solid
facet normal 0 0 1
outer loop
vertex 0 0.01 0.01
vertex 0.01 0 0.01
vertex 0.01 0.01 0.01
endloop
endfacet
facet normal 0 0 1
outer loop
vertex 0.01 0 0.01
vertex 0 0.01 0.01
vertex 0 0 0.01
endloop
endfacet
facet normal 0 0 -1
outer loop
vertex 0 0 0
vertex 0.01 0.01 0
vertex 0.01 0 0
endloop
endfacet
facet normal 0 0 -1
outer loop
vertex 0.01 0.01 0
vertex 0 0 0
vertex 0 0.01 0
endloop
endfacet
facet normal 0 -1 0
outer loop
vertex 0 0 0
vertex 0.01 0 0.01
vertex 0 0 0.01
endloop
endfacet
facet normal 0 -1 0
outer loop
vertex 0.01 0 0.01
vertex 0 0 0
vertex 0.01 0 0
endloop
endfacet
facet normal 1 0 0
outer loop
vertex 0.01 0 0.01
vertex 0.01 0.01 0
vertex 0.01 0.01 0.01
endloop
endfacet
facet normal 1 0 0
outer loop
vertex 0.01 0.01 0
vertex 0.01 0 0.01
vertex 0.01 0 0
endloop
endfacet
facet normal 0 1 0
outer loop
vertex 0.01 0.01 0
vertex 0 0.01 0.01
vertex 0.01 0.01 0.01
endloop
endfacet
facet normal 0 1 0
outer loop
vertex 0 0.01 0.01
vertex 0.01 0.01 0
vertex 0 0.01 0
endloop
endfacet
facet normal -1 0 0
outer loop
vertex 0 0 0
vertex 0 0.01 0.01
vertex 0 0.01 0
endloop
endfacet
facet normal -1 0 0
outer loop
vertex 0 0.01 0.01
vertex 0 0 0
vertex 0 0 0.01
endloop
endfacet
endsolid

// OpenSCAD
// file: ../../src/common/common_params.scad
/***
 * @module Common Parameters
 * @brief Shared constants and tolerances used by the CurveGears implementation.
 *
 * Historical constants are retained for numerical compatibility.
 */
_cg_pi = 3.14159;
_cg_deg_per_rad = 57.29578;
_cg_tolerance = 1e-7;
_cg_default_fn = 50;
_cg_circle_pi = 3.141592653589793;

/**
 * @module _cg_assert_samples
 * @brief Validate a sampled-curve count while preserving the caller diagnostic.
 * @param samples {integer >= minimum} Requested sample count.
 * @param message {string} Caller-specific diagnostic message.
 * @param minimum {integer, default 120} Minimum supported sample count.
 */
module _cg_assert_samples(samples,message="samples must be an integer >= 120",minimum=120) {
    assert(samples >= minimum && floor(samples)==samples,message);
}
// file: ../../src/common/common_math.scad
/***
 * @module Common Math
 * @brief Shared scalar, angle and vector helpers used by the geometry layers.
 *
 * These functions are internal implementation primitives and are not part of
 * the public family API.
 */
include <common_params.scad>

/** @function _cg_tanh
 * @brief Hyperbolic tangent expressed through OpenSCAD's exponential primitive.
 * @param x {number} Input value.
 * @return {number} Hyperbolic tangent of `x`.
 */
function _cg_tanh(x) =
    let(e=exp(-2*abs(x))) (x<0 ? -1 : 1)*(1-e)/(1+e);

/*** @function _cg_degrees(angle)
 * @brief Convert radians to degrees.
 * @param angle {number} Angle in radians.
 * @return {number} Angle in degrees.
 */
function _cg_degrees(angle) = angle*_cg_deg_per_rad;
/*** @function _cg_radians(angle)
 * @brief Convert degrees to radians.
 * @param angle {number} Angle in degrees.
 * @return {number} Angle in radians.
 */
function _cg_radians(angle) = angle/_cg_deg_per_rad;
/*** @function _cg_polar(p)
 * @brief Convert a polar `[radius, angle]` pair to Cartesian coordinates.
 * @param p {array} Polar pair with angle in degrees.
 * @return {array} Cartesian point `[x, y]`.
 */
function _cg_polar(p) = [p[0]*cos(p[1]),p[0]*sin(p[1])];

/*** @function _cg_vsub(a, b)
 * @brief Subtract one two-dimensional vector from another.
 * @param a {array} Left-hand vector.
 * @param b {array} Right-hand vector.
 * @return {array} Difference vector.
 */
function _cg_vsub(a,b) = [a[0]-b[0], a[1]-b[1]];
/*** @function _cg_vlen(a)
 * @brief Calculate the Euclidean length of a two-dimensional vector.
 * @param a {array} Vector.
 * @return {number} Vector length.
 */
function _cg_vlen(a) = sqrt(a[0]*a[0] + a[1]*a[1]);
/*** @function _cg_vunit(a)
 * @brief Normalise a two-dimensional vector, returning zero for a zero vector.
 * @param a {array} Vector.
 * @return {array} Unit vector or `[0, 0]`.
 */
function _cg_vunit(a) = let(l=_cg_vlen(a)) l == 0 ? [0,0] : [a[0]/l,a[1]/l];
/*** @function _cg_lerp(a, b, t)
 * @brief Linearly interpolate between two scalar values.
 * @param a {number} Start value.
 * @param b {number} End value.
 * @param t {number} Interpolation fraction.
 * @return {number} Interpolated value.
 */
function _cg_lerp(a,b,t) = a + t*(b-a);
/*** @function _cg_vlerp(a, b, t)
 * @brief Linearly interpolate between two two-dimensional vectors.
 * @param a {array} Start vector.
 * @param b {array} End vector.
 * @param t {number} Interpolation fraction.
 * @return {array} Interpolated vector.
 */
function _cg_vlerp(a,b,t) = [_cg_lerp(a[0],b[0],t), _cg_lerp(a[1],b[1],t)];
/*** @function _cg_cross2(a, b)
 * @brief Calculate the scalar two-dimensional cross product.
 * @param a {array} First vector.
 * @param b {array} Second vector.
 * @return {number} Signed cross-product magnitude.
 */
function _cg_cross2(a,b) = a[0]*b[1]-a[1]*b[0];
/*** @function _cg_sum(v, i, acc)
 * @brief Sum a scalar array recursively.
 * @param v {array} Scalar values.
 * @param i {integer, default 0} Current index.
 * @param acc {number, default 0} Accumulated sum.
 * @return {number} Sum of the values.
 */
function _cg_sum(v,i=0,acc=0) = i >= len(v) ? acc : _cg_sum(v,i+1,acc+v[i]);
/*** @function _cg_prefix_sums(v, i, acc, out)
 * @brief Build inclusive prefix sums for a scalar array.
 * @param v {array} Scalar values.
 * @param i {integer, default 0} Current index.
 * @param acc {number, default 0} Accumulated sum.
 * @param out {array, default [0]} Prefix-sum output under construction.
 * @return {array} Prefix sums beginning with zero.
 */
function _cg_prefix_sums(v,i=0,acc=0,out=[0]) =
    i >= len(v) ? out : _cg_prefix_sums(v,i+1,acc+v[i],concat(out,[acc+v[i]]));

/*** @function _cg_closed_polyline_perimeter(points)
 * @brief Calculate the perimeter of a closed sampled point list.
 * @param points {array of points} Closed Cartesian polyline.
 * @return {number} Perimeter in the input coordinate units.
 */
function _cg_closed_polyline_perimeter(points) =
    _cg_sum([for(i=[0:len(points)-1])
        _cg_vlen(_cg_vsub(points[(i+1)%len(points)],points[i]))]);

/*** @function _cg_pitch_scale_from_points(modul, tooth_number, unit_points, circumference)
 * @brief Calculate pitch scaling from an existing unit-curve sample.
 * @param modul {number > 0} Tooth module in mm.
 * @param tooth_number {integer >= 3} Requested tooth count.
 * @param unit_points {array of points} Closed unit-curve sample.
 * @param circumference {number > 0, default _cg_pi} Family-selected circumference constant.
 * @return {number} Scale factor for the sampled unit curve.
 */
function _cg_pitch_scale_from_points(modul,tooth_number,unit_points,circumference=_cg_pi) =
    circumference*modul*tooth_number/_cg_closed_polyline_perimeter(unit_points);

/*** @function _cg_scale_points(scale, points)
 * @brief Multiply every sampled point by one scalar.
 * @param scale {number} Point scale factor.
 * @param points {array of points} Cartesian point list.
 * @return {array of points} Scaled Cartesian point list.
 */
function _cg_scale_points(scale,points) = [for(p=points) [scale*p[0],scale*p[1]]];

function _cg_upper_bound_column(tab,target,column,lo,hi) =
    lo>=hi ? max(0,lo) :
    let(mid=floor((lo+hi+1)/2))
    tab[mid][column] <= target
        ? _cg_upper_bound_column(tab,target,column,mid,hi)
        : _cg_upper_bound_column(tab,target,column,lo,mid-1);

/*** @function _cg_interp_x_for_y(tab, target)
 * @brief Interpolate an x value at a monotonic y target in a two-column table.
 * @param tab {array} Table of `[x, y]` samples.
 * @param target {number} Target y value.
 * @return {number} Interpolated x value.
 */
function _cg_interp_x_for_y(tab,target) =
    target < tab[0][1] ? tab[len(tab)-1][0] :
    let(segment=min(len(tab)-2,max(0,_cg_upper_bound_column(tab,target,1,0,len(tab)-1))),
        y0=tab[segment][1],y1=tab[segment+1][1])
    y1>y0 ? _cg_lerp(tab[segment][0],tab[segment+1][0],(target-y0)/(y1-y0)) :
    tab[len(tab)-1][0];

/*** @function _cg_interp_y_for_x(tab, target)
 * @brief Interpolate a y value at a monotonic x target in a two-column table.
 * @param tab {array} Table of `[x, y]` samples.
 * @param target {number} Target x value.
 * @return {number} Interpolated y value.
 */
function _cg_interp_y_for_x(tab,target) =
    target < tab[0][0] ? tab[len(tab)-1][1] :
    let(segment=min(len(tab)-2,max(0,_cg_upper_bound_column(tab,target,0,0,len(tab)-1))),
        x0=tab[segment][0],x1=tab[segment+1][0])
    x1>x0 ? _cg_lerp(tab[segment][1],tab[segment+1][1],(target-x0)/(x1-x0)) :
    tab[len(tab)-1][1];
/***
 * @module Mathematical References
 * @brief Mathematical sources used by the CurveGears families.
 * The ellipse uses the standard parametric ellipse. The lobed family uses a
 * sinusoidally modulated polar radius. The Pascal family uses Pascal's
 * limaçon. The logarithmic spiral follows the standard logarithmic spiral.
 * The epitrochoid follows the rolling-circle construction. The superformula
 * follows Johan Gielis, “A generic geometric transformation that unifies a
 * wide range of natural and abstract shapes”, American Journal of Botany
 * 90(3), 333–338 (2003), DOI 10.3732/ajb.90.3.333.
 * References: https://doi.org/10.3732/ajb.90.3.333
 * Pascal limaçon: https://mathworld.wolfram.com/Limacon.html
 * Logarithmic spiral: https://mathworld.wolfram.com/LogarithmicSpiral.html
 * Epitrochoid: https://mathworld.wolfram.com/Epitrochoid.html
 */
// main file
/***
 * @function common_tanh_limits
 * @brief Verify finite saturation, odd symmetry and continuity of the shared tanh helper.
 * Source: [`common/tanh_limits.scad`](common/tanh_limits.scad)
 */
include <../../src/common/common_math.scad>
assert(_cg_tanh(0)==0);
for(x=[.000001,.1,1,5,400,1e6]) {
    positive=_cg_tanh(x);
    negative=_cg_tanh(-x);
    assert(positive==positive && negative==negative && positive>=0 && positive<=1);
    assert(abs(positive+negative)<1e-12);
    if(x<10) assert(abs(positive-(exp(2*x)-1)/(exp(2*x)+1))<1e-12);
    if(x>=400) assert(positive==1 && negative==-1);
}
echo("PASS: finite tanh saturation and odd symmetry");
cube(.01);
